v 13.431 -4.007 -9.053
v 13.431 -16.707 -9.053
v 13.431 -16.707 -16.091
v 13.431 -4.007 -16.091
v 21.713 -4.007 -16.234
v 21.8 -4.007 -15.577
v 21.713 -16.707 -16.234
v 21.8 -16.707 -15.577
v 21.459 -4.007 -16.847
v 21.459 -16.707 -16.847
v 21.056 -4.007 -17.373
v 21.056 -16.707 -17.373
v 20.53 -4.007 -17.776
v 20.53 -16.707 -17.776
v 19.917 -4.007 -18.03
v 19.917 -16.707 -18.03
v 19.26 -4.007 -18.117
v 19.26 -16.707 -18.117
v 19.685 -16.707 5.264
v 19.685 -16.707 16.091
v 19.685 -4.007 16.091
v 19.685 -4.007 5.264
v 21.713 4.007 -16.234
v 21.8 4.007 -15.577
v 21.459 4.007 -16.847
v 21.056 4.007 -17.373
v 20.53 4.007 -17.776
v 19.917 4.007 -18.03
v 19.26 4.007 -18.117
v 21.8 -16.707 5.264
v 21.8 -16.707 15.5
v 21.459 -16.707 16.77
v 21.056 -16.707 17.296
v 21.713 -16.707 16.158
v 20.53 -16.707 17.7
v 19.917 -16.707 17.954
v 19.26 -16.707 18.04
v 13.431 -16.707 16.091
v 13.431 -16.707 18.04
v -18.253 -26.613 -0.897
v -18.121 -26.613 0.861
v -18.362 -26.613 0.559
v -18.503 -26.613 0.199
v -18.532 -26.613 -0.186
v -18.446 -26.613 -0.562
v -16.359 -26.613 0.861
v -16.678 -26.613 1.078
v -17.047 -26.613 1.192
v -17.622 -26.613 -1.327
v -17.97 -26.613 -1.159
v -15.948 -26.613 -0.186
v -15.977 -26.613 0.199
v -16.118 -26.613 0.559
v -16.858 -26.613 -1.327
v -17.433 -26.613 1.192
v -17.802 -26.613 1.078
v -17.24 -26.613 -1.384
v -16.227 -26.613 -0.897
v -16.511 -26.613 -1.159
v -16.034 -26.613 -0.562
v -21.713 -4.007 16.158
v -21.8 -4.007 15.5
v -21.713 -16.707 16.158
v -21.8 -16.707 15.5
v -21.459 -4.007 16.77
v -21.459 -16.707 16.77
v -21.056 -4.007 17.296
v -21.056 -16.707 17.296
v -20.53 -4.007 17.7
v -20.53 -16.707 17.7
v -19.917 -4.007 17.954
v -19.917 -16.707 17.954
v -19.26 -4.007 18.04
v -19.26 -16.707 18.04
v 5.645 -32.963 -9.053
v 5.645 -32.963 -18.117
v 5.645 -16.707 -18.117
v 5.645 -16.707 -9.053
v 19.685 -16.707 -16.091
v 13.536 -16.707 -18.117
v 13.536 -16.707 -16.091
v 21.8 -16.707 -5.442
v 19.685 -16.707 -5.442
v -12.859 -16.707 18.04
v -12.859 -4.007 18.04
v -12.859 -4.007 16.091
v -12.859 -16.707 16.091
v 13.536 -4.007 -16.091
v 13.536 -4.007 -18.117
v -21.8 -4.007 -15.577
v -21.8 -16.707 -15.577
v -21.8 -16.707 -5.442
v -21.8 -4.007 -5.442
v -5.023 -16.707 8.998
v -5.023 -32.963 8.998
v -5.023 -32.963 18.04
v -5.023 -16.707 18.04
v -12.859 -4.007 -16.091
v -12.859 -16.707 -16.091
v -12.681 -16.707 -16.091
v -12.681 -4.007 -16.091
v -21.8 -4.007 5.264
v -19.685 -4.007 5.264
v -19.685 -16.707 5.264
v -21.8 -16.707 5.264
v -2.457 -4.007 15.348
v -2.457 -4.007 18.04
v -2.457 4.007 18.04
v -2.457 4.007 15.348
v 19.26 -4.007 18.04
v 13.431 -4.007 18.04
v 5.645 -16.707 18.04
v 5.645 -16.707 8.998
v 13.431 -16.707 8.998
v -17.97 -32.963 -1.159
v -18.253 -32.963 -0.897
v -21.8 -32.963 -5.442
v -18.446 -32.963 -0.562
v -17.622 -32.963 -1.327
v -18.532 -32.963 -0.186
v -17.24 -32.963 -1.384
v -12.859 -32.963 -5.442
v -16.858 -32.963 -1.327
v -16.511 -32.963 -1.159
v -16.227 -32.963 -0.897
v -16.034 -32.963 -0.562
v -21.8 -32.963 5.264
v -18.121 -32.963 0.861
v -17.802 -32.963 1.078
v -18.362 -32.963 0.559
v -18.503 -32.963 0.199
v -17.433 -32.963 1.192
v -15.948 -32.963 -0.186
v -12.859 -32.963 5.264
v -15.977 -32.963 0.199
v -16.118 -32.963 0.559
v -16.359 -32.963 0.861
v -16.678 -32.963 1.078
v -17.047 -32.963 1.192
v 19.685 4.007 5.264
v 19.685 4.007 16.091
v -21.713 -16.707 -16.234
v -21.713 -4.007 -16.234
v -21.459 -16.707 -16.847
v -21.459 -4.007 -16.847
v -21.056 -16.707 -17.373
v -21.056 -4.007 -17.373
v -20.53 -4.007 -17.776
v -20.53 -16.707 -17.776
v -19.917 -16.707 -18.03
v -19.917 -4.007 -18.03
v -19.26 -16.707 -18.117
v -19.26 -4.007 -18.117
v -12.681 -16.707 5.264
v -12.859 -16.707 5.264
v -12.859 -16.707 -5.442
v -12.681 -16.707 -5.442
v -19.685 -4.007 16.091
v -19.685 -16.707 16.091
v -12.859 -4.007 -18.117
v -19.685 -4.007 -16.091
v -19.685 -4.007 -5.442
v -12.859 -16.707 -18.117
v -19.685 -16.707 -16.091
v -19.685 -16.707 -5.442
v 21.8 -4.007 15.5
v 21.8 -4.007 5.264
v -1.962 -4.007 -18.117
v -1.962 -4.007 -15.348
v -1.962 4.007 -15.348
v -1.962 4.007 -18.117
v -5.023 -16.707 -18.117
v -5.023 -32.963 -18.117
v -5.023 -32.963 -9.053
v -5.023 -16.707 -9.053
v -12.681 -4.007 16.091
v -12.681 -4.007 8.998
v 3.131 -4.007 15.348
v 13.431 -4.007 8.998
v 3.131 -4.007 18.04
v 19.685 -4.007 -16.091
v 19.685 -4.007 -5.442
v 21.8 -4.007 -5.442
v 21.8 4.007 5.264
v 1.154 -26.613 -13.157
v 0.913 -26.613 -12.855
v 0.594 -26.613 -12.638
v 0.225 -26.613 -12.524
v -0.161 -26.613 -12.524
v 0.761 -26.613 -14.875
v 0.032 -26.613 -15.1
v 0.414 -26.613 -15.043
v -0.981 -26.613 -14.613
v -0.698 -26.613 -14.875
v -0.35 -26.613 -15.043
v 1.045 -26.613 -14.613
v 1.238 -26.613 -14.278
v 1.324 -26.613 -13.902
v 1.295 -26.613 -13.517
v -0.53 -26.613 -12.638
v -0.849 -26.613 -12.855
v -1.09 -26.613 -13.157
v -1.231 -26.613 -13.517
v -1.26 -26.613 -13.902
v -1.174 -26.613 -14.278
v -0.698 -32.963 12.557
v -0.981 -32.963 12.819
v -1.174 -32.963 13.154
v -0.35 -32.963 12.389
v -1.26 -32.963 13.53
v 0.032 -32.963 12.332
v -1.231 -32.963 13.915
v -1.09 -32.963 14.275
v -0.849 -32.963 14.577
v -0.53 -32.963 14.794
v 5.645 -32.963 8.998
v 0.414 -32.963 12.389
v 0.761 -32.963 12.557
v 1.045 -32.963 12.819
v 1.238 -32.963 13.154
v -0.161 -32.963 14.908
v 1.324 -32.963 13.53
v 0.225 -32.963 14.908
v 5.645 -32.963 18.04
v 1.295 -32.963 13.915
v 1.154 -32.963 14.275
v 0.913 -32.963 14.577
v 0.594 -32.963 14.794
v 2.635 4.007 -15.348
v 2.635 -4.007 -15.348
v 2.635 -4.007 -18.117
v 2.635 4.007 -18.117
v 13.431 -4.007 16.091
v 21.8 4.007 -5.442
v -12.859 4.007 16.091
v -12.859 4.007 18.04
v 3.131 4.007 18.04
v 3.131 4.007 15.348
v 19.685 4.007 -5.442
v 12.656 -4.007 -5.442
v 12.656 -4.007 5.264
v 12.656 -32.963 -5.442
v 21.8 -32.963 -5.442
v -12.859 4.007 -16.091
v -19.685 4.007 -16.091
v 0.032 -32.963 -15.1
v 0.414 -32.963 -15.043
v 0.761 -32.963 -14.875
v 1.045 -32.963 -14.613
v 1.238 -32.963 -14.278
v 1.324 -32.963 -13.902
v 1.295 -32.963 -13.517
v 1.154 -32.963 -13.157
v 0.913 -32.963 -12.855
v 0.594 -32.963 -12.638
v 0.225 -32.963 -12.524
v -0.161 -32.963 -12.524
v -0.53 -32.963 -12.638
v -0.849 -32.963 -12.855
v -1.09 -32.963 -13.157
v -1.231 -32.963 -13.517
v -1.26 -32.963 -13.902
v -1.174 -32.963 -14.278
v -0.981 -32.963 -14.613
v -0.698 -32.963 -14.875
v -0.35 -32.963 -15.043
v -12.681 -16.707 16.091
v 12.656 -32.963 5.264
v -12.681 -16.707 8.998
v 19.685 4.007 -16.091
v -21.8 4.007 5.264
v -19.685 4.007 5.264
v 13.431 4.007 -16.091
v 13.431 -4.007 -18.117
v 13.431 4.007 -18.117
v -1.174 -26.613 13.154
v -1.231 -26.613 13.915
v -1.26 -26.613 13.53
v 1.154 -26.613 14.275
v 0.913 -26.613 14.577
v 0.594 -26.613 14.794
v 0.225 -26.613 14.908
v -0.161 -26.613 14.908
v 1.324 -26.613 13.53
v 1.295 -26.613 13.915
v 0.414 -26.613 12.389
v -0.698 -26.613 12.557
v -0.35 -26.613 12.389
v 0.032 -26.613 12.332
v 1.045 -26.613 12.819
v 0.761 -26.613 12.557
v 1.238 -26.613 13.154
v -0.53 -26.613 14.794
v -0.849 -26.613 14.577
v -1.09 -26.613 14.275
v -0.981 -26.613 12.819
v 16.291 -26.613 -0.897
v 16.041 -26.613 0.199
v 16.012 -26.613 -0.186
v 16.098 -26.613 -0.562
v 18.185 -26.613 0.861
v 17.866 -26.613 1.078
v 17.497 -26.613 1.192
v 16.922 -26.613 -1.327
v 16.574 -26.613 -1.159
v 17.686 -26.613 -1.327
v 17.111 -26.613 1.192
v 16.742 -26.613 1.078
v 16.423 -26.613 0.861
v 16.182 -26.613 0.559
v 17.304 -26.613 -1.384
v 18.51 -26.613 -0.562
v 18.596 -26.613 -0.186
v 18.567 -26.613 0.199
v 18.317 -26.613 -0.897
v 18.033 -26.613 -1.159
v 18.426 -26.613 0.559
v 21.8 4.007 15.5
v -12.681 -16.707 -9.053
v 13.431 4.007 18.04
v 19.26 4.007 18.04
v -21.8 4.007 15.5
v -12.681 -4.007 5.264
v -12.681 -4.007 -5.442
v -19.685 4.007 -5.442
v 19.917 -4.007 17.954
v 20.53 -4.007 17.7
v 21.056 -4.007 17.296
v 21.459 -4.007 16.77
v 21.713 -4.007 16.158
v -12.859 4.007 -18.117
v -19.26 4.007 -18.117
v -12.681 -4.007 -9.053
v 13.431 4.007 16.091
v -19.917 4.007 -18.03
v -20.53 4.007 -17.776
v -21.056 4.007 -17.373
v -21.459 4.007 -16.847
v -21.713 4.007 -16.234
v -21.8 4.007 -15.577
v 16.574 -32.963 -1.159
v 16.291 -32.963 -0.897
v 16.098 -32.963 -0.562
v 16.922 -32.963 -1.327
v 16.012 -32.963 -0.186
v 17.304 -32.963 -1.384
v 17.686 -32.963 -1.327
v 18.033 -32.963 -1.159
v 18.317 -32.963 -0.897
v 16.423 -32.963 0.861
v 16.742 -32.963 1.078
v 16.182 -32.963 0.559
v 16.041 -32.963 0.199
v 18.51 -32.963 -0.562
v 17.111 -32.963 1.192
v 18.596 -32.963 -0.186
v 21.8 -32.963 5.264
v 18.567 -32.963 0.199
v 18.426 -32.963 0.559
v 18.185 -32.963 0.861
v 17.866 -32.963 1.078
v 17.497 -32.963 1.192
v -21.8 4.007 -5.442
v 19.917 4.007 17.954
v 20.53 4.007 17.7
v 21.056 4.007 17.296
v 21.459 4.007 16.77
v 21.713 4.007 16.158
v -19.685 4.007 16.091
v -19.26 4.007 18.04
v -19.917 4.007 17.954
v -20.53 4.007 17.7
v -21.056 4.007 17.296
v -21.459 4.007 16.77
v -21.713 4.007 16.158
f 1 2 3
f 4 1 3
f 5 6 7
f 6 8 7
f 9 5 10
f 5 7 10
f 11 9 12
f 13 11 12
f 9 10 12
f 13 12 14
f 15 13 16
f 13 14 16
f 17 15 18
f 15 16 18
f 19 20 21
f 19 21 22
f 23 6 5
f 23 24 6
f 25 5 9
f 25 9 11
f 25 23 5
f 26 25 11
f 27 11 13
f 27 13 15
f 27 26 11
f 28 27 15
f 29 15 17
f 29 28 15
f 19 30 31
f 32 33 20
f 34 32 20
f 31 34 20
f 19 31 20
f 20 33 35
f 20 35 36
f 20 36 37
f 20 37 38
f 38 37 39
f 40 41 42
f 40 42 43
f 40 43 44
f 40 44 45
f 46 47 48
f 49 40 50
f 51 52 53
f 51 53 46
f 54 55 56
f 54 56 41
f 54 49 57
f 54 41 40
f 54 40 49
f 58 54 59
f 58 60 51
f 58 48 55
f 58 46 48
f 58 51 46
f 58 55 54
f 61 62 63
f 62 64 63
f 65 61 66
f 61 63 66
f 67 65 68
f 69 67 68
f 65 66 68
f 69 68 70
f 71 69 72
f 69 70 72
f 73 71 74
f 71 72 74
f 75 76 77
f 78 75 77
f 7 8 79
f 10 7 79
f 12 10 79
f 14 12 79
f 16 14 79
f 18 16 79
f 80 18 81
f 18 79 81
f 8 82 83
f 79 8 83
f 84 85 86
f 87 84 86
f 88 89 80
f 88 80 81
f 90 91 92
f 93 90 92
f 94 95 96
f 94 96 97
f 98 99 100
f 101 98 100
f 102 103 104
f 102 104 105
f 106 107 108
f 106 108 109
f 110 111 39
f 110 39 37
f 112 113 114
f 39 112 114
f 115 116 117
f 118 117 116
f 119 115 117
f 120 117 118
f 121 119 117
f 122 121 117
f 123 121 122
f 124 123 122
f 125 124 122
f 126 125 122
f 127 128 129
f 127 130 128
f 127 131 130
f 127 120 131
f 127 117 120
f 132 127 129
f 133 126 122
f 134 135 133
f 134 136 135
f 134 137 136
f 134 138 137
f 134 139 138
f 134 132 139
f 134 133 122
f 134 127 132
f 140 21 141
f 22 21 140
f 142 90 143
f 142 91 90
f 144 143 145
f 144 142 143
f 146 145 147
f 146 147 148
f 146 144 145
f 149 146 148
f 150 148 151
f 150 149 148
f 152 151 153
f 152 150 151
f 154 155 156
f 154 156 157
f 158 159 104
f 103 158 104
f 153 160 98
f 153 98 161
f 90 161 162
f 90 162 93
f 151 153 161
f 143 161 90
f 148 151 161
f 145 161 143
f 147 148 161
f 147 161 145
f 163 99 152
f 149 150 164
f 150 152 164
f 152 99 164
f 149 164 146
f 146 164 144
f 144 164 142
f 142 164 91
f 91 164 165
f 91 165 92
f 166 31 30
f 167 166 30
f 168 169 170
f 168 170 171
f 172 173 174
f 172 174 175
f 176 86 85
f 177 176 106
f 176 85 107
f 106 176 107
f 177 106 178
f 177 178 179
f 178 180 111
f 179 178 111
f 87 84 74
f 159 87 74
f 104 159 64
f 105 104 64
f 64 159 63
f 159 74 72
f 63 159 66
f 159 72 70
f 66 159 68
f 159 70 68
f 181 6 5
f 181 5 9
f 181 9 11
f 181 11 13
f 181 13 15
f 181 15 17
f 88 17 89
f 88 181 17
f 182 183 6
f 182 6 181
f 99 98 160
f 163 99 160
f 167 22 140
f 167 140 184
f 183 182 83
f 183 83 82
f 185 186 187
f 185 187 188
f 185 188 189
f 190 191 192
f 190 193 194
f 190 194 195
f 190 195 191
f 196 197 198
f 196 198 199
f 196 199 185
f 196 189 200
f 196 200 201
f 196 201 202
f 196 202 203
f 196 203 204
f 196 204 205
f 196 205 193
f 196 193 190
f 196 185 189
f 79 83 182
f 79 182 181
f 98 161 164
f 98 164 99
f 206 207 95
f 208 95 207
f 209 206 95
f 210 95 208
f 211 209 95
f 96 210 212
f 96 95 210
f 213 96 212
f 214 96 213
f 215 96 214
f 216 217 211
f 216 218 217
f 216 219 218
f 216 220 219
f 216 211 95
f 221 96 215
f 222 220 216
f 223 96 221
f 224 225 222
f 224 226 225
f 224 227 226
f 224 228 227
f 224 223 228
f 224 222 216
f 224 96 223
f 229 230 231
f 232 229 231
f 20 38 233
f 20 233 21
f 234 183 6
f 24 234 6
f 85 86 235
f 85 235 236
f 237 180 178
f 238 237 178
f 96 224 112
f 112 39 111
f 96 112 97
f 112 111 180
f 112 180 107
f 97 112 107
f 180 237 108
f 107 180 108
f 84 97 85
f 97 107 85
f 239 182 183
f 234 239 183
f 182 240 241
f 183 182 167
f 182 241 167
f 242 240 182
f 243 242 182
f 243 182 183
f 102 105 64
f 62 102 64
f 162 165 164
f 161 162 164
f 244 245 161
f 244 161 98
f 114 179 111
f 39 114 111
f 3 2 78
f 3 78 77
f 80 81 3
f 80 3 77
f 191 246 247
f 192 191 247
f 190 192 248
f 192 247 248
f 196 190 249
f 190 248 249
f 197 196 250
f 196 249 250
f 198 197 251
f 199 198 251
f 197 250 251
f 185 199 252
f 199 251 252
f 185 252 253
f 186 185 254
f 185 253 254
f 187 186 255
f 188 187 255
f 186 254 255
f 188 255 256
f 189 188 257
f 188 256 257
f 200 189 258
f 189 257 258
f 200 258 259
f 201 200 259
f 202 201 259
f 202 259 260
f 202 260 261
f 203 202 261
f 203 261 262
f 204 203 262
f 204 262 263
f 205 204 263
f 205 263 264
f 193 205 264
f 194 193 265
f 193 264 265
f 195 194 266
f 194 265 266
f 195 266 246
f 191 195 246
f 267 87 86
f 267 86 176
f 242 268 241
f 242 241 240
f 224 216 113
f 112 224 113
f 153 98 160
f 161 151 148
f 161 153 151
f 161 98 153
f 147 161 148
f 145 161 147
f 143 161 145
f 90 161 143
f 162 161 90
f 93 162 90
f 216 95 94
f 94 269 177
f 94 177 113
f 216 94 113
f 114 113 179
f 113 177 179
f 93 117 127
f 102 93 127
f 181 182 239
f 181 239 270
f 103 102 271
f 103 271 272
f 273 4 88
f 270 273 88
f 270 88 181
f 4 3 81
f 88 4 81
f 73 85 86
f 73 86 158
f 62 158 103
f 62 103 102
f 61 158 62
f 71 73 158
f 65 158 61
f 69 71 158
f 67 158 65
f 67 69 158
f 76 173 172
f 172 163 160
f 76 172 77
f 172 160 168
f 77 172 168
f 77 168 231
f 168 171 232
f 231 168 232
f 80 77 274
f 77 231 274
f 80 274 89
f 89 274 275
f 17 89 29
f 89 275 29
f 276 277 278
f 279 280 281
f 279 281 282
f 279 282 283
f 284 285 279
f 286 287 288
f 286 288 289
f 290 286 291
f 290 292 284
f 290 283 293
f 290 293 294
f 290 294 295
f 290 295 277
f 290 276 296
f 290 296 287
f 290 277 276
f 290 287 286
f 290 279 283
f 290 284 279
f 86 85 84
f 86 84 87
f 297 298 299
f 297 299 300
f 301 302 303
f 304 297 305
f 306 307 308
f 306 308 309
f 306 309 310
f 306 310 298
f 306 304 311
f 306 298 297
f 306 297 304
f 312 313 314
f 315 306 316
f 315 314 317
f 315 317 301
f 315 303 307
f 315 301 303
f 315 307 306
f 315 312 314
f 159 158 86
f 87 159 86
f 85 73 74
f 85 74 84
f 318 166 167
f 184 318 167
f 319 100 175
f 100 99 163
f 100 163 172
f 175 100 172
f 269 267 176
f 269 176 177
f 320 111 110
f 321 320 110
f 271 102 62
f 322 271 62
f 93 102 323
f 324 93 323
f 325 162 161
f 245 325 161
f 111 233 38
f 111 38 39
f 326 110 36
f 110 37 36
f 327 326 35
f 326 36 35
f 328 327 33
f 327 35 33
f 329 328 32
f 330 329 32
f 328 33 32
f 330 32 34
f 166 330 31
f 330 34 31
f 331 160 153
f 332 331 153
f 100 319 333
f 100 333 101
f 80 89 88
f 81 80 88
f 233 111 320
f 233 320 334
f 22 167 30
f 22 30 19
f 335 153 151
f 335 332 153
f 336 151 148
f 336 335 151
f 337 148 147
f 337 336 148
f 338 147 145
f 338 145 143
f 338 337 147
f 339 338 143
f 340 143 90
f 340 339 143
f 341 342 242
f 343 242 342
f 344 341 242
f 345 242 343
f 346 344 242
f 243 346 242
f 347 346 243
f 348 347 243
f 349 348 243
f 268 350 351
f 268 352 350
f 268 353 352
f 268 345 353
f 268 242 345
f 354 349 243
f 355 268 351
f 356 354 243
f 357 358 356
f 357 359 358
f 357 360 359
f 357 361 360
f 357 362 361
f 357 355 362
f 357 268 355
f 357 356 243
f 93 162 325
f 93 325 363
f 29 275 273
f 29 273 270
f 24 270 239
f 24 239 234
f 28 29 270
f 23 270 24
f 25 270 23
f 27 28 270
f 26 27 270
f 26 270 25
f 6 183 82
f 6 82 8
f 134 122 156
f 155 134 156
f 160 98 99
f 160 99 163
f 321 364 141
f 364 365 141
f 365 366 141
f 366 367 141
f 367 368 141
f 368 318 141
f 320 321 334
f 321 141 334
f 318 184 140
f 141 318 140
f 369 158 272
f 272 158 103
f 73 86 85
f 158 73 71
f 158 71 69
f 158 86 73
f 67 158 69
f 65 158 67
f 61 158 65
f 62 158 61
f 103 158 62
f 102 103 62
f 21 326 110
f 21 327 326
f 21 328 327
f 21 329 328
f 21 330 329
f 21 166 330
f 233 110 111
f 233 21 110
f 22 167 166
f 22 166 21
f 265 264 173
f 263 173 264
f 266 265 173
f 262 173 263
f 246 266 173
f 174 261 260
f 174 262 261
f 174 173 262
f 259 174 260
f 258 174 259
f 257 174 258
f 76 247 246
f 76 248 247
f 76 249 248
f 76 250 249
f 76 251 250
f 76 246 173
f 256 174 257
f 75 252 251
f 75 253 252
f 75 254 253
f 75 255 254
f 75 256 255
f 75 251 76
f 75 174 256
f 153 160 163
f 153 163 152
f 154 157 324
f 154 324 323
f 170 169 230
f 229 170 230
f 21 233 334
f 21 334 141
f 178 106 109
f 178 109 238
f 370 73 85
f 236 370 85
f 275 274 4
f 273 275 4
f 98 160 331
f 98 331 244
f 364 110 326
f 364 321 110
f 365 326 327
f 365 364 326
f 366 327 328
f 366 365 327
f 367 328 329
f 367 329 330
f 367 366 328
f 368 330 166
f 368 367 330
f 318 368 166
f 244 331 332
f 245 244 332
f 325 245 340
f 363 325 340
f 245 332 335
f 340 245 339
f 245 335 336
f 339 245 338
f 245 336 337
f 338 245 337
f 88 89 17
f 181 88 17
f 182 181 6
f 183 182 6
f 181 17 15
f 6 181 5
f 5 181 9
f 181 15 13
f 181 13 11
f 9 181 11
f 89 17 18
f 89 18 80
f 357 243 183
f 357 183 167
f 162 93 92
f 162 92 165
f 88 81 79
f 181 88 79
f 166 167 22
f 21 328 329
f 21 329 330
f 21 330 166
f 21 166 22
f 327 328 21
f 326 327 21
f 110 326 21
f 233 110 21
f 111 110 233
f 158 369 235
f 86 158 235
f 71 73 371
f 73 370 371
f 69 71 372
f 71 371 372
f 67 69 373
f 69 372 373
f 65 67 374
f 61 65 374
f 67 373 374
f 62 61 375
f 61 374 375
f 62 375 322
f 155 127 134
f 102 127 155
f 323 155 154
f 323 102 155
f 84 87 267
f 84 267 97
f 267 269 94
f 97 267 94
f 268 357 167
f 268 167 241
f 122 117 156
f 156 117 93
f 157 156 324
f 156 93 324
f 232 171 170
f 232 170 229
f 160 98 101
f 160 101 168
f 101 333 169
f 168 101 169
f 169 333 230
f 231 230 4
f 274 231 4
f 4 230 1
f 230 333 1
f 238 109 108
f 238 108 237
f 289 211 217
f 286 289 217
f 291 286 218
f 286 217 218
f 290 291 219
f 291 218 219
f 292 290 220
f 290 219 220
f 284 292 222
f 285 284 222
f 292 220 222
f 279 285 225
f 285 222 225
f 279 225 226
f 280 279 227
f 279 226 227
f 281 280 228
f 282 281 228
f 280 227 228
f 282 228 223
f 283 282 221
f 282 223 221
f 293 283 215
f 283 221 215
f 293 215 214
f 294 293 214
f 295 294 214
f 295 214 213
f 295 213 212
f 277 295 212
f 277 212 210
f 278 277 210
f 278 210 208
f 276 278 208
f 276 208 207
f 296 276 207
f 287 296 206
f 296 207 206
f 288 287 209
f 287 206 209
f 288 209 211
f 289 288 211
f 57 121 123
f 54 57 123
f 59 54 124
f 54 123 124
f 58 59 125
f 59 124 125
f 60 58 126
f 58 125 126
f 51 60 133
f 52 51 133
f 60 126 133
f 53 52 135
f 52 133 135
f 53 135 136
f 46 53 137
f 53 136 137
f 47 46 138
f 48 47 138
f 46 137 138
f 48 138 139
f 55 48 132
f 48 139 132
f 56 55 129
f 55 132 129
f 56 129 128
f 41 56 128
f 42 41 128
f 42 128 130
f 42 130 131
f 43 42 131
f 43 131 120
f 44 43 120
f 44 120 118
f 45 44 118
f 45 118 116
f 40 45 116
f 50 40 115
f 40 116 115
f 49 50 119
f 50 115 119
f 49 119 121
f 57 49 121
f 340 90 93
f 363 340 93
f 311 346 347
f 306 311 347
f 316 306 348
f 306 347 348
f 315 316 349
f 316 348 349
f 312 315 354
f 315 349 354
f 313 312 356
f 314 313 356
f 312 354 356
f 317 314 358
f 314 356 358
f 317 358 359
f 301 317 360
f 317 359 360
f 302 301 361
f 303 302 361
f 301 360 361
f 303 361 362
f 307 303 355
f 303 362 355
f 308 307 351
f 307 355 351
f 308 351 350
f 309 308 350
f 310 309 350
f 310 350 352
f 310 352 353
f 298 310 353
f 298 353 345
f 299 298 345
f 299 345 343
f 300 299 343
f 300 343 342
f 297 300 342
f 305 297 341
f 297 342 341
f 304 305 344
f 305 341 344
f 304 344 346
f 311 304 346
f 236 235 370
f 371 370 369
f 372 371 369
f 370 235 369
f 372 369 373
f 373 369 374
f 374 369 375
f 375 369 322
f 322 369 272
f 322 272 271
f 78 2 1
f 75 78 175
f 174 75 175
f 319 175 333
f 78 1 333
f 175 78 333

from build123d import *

# Parameters (mm, degrees)
BOSS_EXTRUDE1_DEPTH        = 4.00685
BOSS_EXTRUDE1_DEPTH_BACK   = 4.00685
SKETCH2_W                  = 4.5974
SKETCH2_H                  = 2.7686
BOSS_EXTRUDE1_2_DEPTH      = 4.00685
BOSS_EXTRUDE1_2_DEPTH_BACK = 4.00685
BOSS_EXTRUDE1_3_DEPTH      = 4.00685
BOSS_EXTRUDE1_3_DEPTH_BACK = 4.00685
BOSS_EXTRUDE1_4_DEPTH      = 4.00685
BOSS_EXTRUDE1_4_DEPTH_BACK = 4.00685
SKETCH2_W_2                = 5.588
SKETCH2_H_2                = 2.6924
BOSS_EXTRUDE1_5_DEPTH      = 4.00685
BOSS_EXTRUDE1_5_DEPTH_BACK = 4.00685
BOSS_EXTRUDE1_6_DEPTH      = 4.00685
BOSS_EXTRUDE1_6_DEPTH_BACK = 4.00685
SKETCH3_W                  = 9.1186
SKETCH3_H                  = 10.7061
BOSS_EXTRUDE2_DEPTH        = 28.956
BOSS_EXTRUDE4_DEPTH        = 12.7
BOSS_EXTRUDE4_2_DEPTH      = 12.7
BOSS_EXTRUDE4_3_DEPTH      = 12.7
BOSS_EXTRUDE4_4_DEPTH      = 12.7
CUT_EXTRUDE4_DEPTH         = 44.473891524
CUT_EXTRUDE4_DEPTH_BACK    = 44.473891524
SKETCH6_W                  = 6.25405
SKETCH6_H                  = 10.64895
SKETCH6_W_2                = 7.00405
SKETCH6_H_2                = 10.82675
CUT_EXTRUDE5_START         = -36.1569
CUT_EXTRUDE5_OUTLINE_W     = 7.8366
CUT_EXTRUDE5_OUTLINE_H     = 16.256
CUT_EXTRUDE5_DEPTH         = 36.1569
CUT_EXTRUDE5_2_OUTLINE_W   = 7.7858
CUT_EXTRUDE5_2_OUTLINE_H   = 16.256
CUT_EXTRUDE5_2_DEPTH       = 9.063080747
CUT_EXTRUDE5_START_2       = -9.0424
CUT_EXTRUDE5_3_OUTLINE_W   = 7.7858
CUT_EXTRUDE5_3_OUTLINE_H   = 16.256
CUT_EXTRUDE5_3_DEPTH       = 9.0424
SKETCH9_W                  = 2.02565
SKETCH9_H                  = 16.256
CUT_EXTRUDE6_DEPTH         = 3.556
FILLET2_R                  = 2.54
FILLET3_R                  = 2.54
FILLET4_R                  = 2.54
FILLET5_R                  = 2.54
FILLET6_R                  = 2.54
FILLET7_R                  = 2.54
FILLET8_R                  = 2.54
FILLET9_R                  = 2.54
SKETCH10_R                 = 1.2954
CUT_EXTRUDE7_DEPTH         = 6.35


# Read off the part's stored shape, not the designer's step: Cut-Extrude5
with BuildPart() as part:
    # Sketch2 → Boss-Extrude1 (new, two sides: drawn at the far end of the back side and taken through both)
    with BuildSketch(Plane(origin=(0, 0, 0), x_dir=(1, 0, 0), z_dir=(0, 1, 0)).offset(-BOSS_EXTRUDE1_DEPTH_BACK)):
        with Locations((0.33655, 16.73225)):
            Rectangle(SKETCH2_W, SKETCH2_H)
    extrude(amount=BOSS_EXTRUDE1_DEPTH + BOSS_EXTRUDE1_DEPTH_BACK)


with BuildPart() as body_2:
    # Sketch2 → Boss-Extrude1 2 (new, two sides: drawn at the far end of the back side and taken through both)
    with BuildSketch(Plane(origin=(0, 0, 0), x_dir=(1, 0, 0), z_dir=(0, 1, 0)).offset(-BOSS_EXTRUDE1_2_DEPTH_BACK)):
        Polygon((13.43095, 15.34795), (19.03095, 15.34795), (19.03095, 5.44195), (21.79955, 5.44195), (21.79955, 15.34795), (21.79955, 18.11655), (19.03095, 18.11655), (13.43095, 18.11655), align=None)
    extrude(amount=BOSS_EXTRUDE1_2_DEPTH + BOSS_EXTRUDE1_2_DEPTH_BACK)


    add(part.part)  # Boss-Extrude2 merges part


with BuildPart() as body_3:
    # Sketch2 → Boss-Extrude1 3 (new, two sides: drawn at the far end of the back side and taken through both)
    with BuildSketch(Plane(origin=(0, 0, 0), x_dir=(1, 0, 0), z_dir=(0, 1, 0)).offset(-BOSS_EXTRUDE1_3_DEPTH_BACK)):
        Polygon((-19.03095, -15.34795), (-12.85945, -15.34795), (-12.85945, -18.04035), (-19.03095, -18.04035), (-21.79955, -18.04035), (-21.79955, -15.34795), (-21.79955, -5.26415), (-19.03095, -5.26415), align=None)
    extrude(amount=BOSS_EXTRUDE1_3_DEPTH + BOSS_EXTRUDE1_3_DEPTH_BACK)


with BuildPart() as body_4:
    # Sketch2 → Boss-Extrude1 4 (new, two sides: drawn at the far end of the back side and taken through both)
    with BuildSketch(Plane(origin=(0, 0, 0), x_dir=(1, 0, 0), z_dir=(0, 1, 0)).offset(-BOSS_EXTRUDE1_4_DEPTH_BACK)):
        with Locations((0.33655, -16.69415)):
            Rectangle(SKETCH2_W_2, SKETCH2_H_2)
    extrude(amount=BOSS_EXTRUDE1_4_DEPTH + BOSS_EXTRUDE1_4_DEPTH_BACK)


with BuildPart() as body_5:
    # Sketch2 → Boss-Extrude1 5 (new, two sides: drawn at the far end of the back side and taken through both)
    with BuildSketch(Plane(origin=(0, 0, 0), x_dir=(1, 0, 0), z_dir=(0, 1, 0)).offset(-BOSS_EXTRUDE1_5_DEPTH_BACK)):
        Polygon((13.43095, -15.34795), (19.03095, -15.34795), (19.03095, -5.26415), (21.79955, -5.26415), (21.79955, -15.34795), (21.79955, -18.04035), (19.03095, -18.04035), (13.43095, -18.04035), align=None)
    extrude(amount=BOSS_EXTRUDE1_5_DEPTH + BOSS_EXTRUDE1_5_DEPTH_BACK)


with BuildPart() as body_6:
    # Sketch2 → Boss-Extrude1 6 (new, two sides: drawn at the far end of the back side and taken through both)
    with BuildSketch(Plane(origin=(0, 0, 0), x_dir=(1, 0, 0), z_dir=(0, 1, 0)).offset(-BOSS_EXTRUDE1_6_DEPTH_BACK)):
        Polygon((-12.85945, 15.34795), (-19.03095, 15.34795), (-19.03095, 5.44195), (-21.79955, 5.44195), (-21.79955, 15.34795), (-21.79955, 18.11655), (-19.03095, 18.11655), (-12.85945, 18.11655), align=None)
    extrude(amount=BOSS_EXTRUDE1_6_DEPTH + BOSS_EXTRUDE1_6_DEPTH_BACK)


with BuildPart() as body_2_1:
    add(body_2.part)

    add(body_4.part)  # Boss-Extrude2 merges body 4
    # Sketch3 → Boss-Extrude2 (add)
    with BuildSketch(Plane.XZ.offset(4.00685)):
        Polygon((13.43095, 18.04035), (-12.85945, 18.04035), (-12.85945, 8.99795), (13.43095, 8.99795), (13.43095, 15.34795), align=None)
        with Locations((-17.24025, -0.0889)):
            Rectangle(SKETCH3_W, SKETCH3_H)
        Polygon((-12.85945, -9.053469253), (-12.85945, -11.76655), (-12.85945, -18.11655), (13.536228167, -18.11655), (13.536228167, -9.053469253), align=None)
        Polygon((12.65555, -5.44195), (21.79955, -5.44195), (21.79955, 5.26415), (19.03095, 5.26415), (12.65555, 5.26415), align=None)
    extrude(amount=BOSS_EXTRUDE2_DEPTH)


with BuildPart() as body_5_2:
    # Sketch5 → Boss-Extrude4 (new body)
    with BuildSketch(Plane.XZ.offset(4.00685)):
        Polygon((-21.79955, 5.26415), (-21.79955, 18.04035), (-12.85945, 18.04035), (-12.85945, 15.34795), (-19.03095, 15.34795), (-19.03095, 5.26415), align=None)
    extrude(amount=BOSS_EXTRUDE4_DEPTH)


with BuildPart() as body_6_2:
    # Sketch5 → Boss-Extrude4 2 (new body)
    with BuildSketch(Plane.XZ.offset(4.00685)):
        Polygon((-21.79955, -5.44195), (-19.03095, -5.44195), (-19.03095, -15.34795), (-12.85945, -15.34795), (-12.85945, -18.11655), (-21.79955, -18.11655), align=None)
    extrude(amount=BOSS_EXTRUDE4_2_DEPTH)


with BuildPart() as body_7:
    # Sketch5 → Boss-Extrude4 3 (new body)
    with BuildSketch(Plane.XZ.offset(4.00685)):
        Polygon((13.43095, 18.04035), (21.79955, 18.04035), (21.79955, 5.26415), (19.03095, 5.26415), (19.03095, 15.34795), (13.43095, 15.34795), align=None)
    extrude(amount=BOSS_EXTRUDE4_3_DEPTH)


with BuildPart() as body_8:
    # Sketch5 → Boss-Extrude4 4 (new body)
    with BuildSketch(Plane.XZ.offset(4.00685)):
        Polygon((17.22755, -5.44195), (21.79955, -5.44195), (21.79955, -18.11655), (13.536228167, -18.11655), (13.536228167, -15.34795), (19.03095, -15.34795), align=None)
    extrude(amount=BOSS_EXTRUDE4_4_DEPTH)


with BuildPart() as cut_extrude4_tool:
    # Sketch6 → Cut-Extrude4 (new, two sides: drawn at the far end of the back side and taken through both)
    with BuildSketch(Plane(origin=(0, 0, 0), x_dir=(1, 0, 0), z_dir=(0, 1, 0)).offset(-CUT_EXTRUDE4_DEPTH_BACK)):
        with Locations((16.557975, 10.766425)):
            Rectangle(SKETCH6_W, SKETCH6_H)
        with Locations((-16.182975, 10.766425)):
            Rectangle(SKETCH6_W_2, SKETCH6_H)
        with Locations((-16.182975, -10.677525)):
            Rectangle(SKETCH6_W_2, SKETCH6_H_2)
        with Locations((16.557975, -10.677525)):
            Rectangle(SKETCH6_W, SKETCH6_H_2)
    extrude(amount=CUT_EXTRUDE4_DEPTH + CUT_EXTRUDE4_DEPTH_BACK)


with BuildPart() as body_2_2:
    add(body_2_1.part)

    # Cut-Extrude4: cut by cut_extrude4_tool
    add(cut_extrude4_tool.part, mode=Mode.SUBTRACT)

    # Cut-Extrude5 outline → Cut-Extrude5 (cut)
    with BuildSketch(Plane.XY.offset(18.04035).offset(CUT_EXTRUDE5_START)):
        with Locations((-8.94115, -24.83485)):
            Rectangle(CUT_EXTRUDE5_OUTLINE_W, CUT_EXTRUDE5_OUTLINE_H)
    extrude(amount=CUT_EXTRUDE5_DEPTH, mode=Mode.SUBTRACT)

    # Cut-Extrude5 2 outline → Cut-Extrude5 2 (cut)
    with BuildSketch(Plane.XY.offset(18.04035).offset(CUT_EXTRUDE5_START)):
        with Locations((9.53805, -24.83485)):
            Rectangle(CUT_EXTRUDE5_2_OUTLINE_W, CUT_EXTRUDE5_2_OUTLINE_H)
    extrude(amount=CUT_EXTRUDE5_2_DEPTH, mode=Mode.SUBTRACT)

    # Cut-Extrude5 3 outline → Cut-Extrude5 3 (cut)
    with BuildSketch(Plane.XY.offset(18.04035).offset(CUT_EXTRUDE5_START_2)):
        with Locations((9.53805, -24.83485)):
            Rectangle(CUT_EXTRUDE5_3_OUTLINE_W, CUT_EXTRUDE5_3_OUTLINE_H)
    extrude(amount=CUT_EXTRUDE5_3_DEPTH, mode=Mode.SUBTRACT)

    # Sketch9 → Cut-Extrude6 (cut)
    with BuildSketch(Plane(origin=(13.536228167, 0, 0), x_dir=(0, 0, -1), z_dir=(1, 0, 0))):
        with Locations((17.103725, -24.83485)):
            Rectangle(SKETCH9_W, SKETCH9_H)
    extrude(amount=-CUT_EXTRUDE6_DEPTH, mode=Mode.SUBTRACT)

    # Fillet4
    fillet4_edges = [body_2_2.edges().sort_by_distance(p)[0] for p in [
        (21.79955, 0, -18.11655),
    ]]
    fillet(fillet4_edges, radius=FILLET4_R)

    # Sketch10 → Cut-Extrude7 (cut)
    with BuildSketch(Plane.XZ.offset(32.96285)):
        with Locations(Location((-17.24025, -0.0889, 0), (0, 0, 270))):
            Circle(SKETCH10_R)
        with Locations(Location((17.30375, -0.0889, 0), (0, 0, 270))):
            Circle(SKETCH10_R)
        with Locations(Location((0.03175, 13.6271, 0), (0, 0, 270))):
            Circle(SKETCH10_R)
        with Locations(Location((0.03175, -13.8049, 0), (0, 0, 270))):
            Circle(SKETCH10_R)
    extrude(amount=-CUT_EXTRUDE7_DEPTH, mode=Mode.SUBTRACT)


with BuildPart() as body_3_1:
    add(body_3.part)

    # Cut-Extrude4: cut by cut_extrude4_tool
    add(cut_extrude4_tool.part, mode=Mode.SUBTRACT)

    # Fillet6
    fillet6_edges = [body_3_1.edges().sort_by_distance(p)[0] for p in [
        (-21.79955, 0, 18.04035),
    ]]
    fillet(fillet6_edges, radius=FILLET6_R)


with BuildPart() as body_5_1:
    add(body_5.part)

    # Cut-Extrude4: cut by cut_extrude4_tool
    add(cut_extrude4_tool.part, mode=Mode.SUBTRACT)

    # Fillet9
    fillet9_edges = [body_5_1.edges().sort_by_distance(p)[0] for p in [
        (21.79955, 0, 18.04035),
    ]]
    fillet(fillet9_edges, radius=FILLET9_R)


with BuildPart() as body_6_1:
    add(body_6.part)

    # Cut-Extrude4: cut by cut_extrude4_tool
    add(cut_extrude4_tool.part, mode=Mode.SUBTRACT)

    # Fillet3
    fillet3_edges = [body_6_1.edges().sort_by_distance(p)[0] for p in [
        (-21.79955, 0, -18.11655),
    ]]
    fillet(fillet3_edges, radius=FILLET3_R)


with BuildPart() as body_5_2_1:
    add(body_5_2.part)

    # Cut-Extrude4: cut by cut_extrude4_tool
    add(cut_extrude4_tool.part, mode=Mode.SUBTRACT)

    # Fillet7
    fillet7_edges = [body_5_2_1.edges().sort_by_distance(p)[0] for p in [
        (-21.79955, -10.35685, 18.04035),
    ]]
    fillet(fillet7_edges, radius=FILLET7_R)


with BuildPart() as body_6_2_1:
    add(body_6_2.part)

    # Cut-Extrude4: cut by cut_extrude4_tool
    add(cut_extrude4_tool.part, mode=Mode.SUBTRACT)

    # Fillet2
    fillet2_edges = [body_6_2_1.edges().sort_by_distance(p)[0] for p in [
        (-21.79955, -10.35685, -18.11655),
    ]]
    fillet(fillet2_edges, radius=FILLET2_R)


with BuildPart() as body_7_1:
    add(body_7.part)

    # Cut-Extrude4: cut by cut_extrude4_tool
    add(cut_extrude4_tool.part, mode=Mode.SUBTRACT)

    # Fillet8
    fillet8_edges = [body_7_1.edges().sort_by_distance(p)[0] for p in [
        (21.79955, -10.35685, 18.04035),
    ]]
    fillet(fillet8_edges, radius=FILLET8_R)


with BuildPart() as body_8_1:
    add(body_8.part)

    # Cut-Extrude4: cut by cut_extrude4_tool
    add(cut_extrude4_tool.part, mode=Mode.SUBTRACT)

    # Fillet5
    fillet5_edges = [body_8_1.edges().sort_by_distance(p)[0] for p in [
        (21.79955, -10.35685, -18.11655),
    ]]
    fillet(fillet5_edges, radius=FILLET5_R)


solid = Compound([body_2_2.part, body_3_1.part, body_5_1.part, body_6_1.part, body_5_2_1.part, body_6_2_1.part, body_7_1.part, body_8_1.part])
